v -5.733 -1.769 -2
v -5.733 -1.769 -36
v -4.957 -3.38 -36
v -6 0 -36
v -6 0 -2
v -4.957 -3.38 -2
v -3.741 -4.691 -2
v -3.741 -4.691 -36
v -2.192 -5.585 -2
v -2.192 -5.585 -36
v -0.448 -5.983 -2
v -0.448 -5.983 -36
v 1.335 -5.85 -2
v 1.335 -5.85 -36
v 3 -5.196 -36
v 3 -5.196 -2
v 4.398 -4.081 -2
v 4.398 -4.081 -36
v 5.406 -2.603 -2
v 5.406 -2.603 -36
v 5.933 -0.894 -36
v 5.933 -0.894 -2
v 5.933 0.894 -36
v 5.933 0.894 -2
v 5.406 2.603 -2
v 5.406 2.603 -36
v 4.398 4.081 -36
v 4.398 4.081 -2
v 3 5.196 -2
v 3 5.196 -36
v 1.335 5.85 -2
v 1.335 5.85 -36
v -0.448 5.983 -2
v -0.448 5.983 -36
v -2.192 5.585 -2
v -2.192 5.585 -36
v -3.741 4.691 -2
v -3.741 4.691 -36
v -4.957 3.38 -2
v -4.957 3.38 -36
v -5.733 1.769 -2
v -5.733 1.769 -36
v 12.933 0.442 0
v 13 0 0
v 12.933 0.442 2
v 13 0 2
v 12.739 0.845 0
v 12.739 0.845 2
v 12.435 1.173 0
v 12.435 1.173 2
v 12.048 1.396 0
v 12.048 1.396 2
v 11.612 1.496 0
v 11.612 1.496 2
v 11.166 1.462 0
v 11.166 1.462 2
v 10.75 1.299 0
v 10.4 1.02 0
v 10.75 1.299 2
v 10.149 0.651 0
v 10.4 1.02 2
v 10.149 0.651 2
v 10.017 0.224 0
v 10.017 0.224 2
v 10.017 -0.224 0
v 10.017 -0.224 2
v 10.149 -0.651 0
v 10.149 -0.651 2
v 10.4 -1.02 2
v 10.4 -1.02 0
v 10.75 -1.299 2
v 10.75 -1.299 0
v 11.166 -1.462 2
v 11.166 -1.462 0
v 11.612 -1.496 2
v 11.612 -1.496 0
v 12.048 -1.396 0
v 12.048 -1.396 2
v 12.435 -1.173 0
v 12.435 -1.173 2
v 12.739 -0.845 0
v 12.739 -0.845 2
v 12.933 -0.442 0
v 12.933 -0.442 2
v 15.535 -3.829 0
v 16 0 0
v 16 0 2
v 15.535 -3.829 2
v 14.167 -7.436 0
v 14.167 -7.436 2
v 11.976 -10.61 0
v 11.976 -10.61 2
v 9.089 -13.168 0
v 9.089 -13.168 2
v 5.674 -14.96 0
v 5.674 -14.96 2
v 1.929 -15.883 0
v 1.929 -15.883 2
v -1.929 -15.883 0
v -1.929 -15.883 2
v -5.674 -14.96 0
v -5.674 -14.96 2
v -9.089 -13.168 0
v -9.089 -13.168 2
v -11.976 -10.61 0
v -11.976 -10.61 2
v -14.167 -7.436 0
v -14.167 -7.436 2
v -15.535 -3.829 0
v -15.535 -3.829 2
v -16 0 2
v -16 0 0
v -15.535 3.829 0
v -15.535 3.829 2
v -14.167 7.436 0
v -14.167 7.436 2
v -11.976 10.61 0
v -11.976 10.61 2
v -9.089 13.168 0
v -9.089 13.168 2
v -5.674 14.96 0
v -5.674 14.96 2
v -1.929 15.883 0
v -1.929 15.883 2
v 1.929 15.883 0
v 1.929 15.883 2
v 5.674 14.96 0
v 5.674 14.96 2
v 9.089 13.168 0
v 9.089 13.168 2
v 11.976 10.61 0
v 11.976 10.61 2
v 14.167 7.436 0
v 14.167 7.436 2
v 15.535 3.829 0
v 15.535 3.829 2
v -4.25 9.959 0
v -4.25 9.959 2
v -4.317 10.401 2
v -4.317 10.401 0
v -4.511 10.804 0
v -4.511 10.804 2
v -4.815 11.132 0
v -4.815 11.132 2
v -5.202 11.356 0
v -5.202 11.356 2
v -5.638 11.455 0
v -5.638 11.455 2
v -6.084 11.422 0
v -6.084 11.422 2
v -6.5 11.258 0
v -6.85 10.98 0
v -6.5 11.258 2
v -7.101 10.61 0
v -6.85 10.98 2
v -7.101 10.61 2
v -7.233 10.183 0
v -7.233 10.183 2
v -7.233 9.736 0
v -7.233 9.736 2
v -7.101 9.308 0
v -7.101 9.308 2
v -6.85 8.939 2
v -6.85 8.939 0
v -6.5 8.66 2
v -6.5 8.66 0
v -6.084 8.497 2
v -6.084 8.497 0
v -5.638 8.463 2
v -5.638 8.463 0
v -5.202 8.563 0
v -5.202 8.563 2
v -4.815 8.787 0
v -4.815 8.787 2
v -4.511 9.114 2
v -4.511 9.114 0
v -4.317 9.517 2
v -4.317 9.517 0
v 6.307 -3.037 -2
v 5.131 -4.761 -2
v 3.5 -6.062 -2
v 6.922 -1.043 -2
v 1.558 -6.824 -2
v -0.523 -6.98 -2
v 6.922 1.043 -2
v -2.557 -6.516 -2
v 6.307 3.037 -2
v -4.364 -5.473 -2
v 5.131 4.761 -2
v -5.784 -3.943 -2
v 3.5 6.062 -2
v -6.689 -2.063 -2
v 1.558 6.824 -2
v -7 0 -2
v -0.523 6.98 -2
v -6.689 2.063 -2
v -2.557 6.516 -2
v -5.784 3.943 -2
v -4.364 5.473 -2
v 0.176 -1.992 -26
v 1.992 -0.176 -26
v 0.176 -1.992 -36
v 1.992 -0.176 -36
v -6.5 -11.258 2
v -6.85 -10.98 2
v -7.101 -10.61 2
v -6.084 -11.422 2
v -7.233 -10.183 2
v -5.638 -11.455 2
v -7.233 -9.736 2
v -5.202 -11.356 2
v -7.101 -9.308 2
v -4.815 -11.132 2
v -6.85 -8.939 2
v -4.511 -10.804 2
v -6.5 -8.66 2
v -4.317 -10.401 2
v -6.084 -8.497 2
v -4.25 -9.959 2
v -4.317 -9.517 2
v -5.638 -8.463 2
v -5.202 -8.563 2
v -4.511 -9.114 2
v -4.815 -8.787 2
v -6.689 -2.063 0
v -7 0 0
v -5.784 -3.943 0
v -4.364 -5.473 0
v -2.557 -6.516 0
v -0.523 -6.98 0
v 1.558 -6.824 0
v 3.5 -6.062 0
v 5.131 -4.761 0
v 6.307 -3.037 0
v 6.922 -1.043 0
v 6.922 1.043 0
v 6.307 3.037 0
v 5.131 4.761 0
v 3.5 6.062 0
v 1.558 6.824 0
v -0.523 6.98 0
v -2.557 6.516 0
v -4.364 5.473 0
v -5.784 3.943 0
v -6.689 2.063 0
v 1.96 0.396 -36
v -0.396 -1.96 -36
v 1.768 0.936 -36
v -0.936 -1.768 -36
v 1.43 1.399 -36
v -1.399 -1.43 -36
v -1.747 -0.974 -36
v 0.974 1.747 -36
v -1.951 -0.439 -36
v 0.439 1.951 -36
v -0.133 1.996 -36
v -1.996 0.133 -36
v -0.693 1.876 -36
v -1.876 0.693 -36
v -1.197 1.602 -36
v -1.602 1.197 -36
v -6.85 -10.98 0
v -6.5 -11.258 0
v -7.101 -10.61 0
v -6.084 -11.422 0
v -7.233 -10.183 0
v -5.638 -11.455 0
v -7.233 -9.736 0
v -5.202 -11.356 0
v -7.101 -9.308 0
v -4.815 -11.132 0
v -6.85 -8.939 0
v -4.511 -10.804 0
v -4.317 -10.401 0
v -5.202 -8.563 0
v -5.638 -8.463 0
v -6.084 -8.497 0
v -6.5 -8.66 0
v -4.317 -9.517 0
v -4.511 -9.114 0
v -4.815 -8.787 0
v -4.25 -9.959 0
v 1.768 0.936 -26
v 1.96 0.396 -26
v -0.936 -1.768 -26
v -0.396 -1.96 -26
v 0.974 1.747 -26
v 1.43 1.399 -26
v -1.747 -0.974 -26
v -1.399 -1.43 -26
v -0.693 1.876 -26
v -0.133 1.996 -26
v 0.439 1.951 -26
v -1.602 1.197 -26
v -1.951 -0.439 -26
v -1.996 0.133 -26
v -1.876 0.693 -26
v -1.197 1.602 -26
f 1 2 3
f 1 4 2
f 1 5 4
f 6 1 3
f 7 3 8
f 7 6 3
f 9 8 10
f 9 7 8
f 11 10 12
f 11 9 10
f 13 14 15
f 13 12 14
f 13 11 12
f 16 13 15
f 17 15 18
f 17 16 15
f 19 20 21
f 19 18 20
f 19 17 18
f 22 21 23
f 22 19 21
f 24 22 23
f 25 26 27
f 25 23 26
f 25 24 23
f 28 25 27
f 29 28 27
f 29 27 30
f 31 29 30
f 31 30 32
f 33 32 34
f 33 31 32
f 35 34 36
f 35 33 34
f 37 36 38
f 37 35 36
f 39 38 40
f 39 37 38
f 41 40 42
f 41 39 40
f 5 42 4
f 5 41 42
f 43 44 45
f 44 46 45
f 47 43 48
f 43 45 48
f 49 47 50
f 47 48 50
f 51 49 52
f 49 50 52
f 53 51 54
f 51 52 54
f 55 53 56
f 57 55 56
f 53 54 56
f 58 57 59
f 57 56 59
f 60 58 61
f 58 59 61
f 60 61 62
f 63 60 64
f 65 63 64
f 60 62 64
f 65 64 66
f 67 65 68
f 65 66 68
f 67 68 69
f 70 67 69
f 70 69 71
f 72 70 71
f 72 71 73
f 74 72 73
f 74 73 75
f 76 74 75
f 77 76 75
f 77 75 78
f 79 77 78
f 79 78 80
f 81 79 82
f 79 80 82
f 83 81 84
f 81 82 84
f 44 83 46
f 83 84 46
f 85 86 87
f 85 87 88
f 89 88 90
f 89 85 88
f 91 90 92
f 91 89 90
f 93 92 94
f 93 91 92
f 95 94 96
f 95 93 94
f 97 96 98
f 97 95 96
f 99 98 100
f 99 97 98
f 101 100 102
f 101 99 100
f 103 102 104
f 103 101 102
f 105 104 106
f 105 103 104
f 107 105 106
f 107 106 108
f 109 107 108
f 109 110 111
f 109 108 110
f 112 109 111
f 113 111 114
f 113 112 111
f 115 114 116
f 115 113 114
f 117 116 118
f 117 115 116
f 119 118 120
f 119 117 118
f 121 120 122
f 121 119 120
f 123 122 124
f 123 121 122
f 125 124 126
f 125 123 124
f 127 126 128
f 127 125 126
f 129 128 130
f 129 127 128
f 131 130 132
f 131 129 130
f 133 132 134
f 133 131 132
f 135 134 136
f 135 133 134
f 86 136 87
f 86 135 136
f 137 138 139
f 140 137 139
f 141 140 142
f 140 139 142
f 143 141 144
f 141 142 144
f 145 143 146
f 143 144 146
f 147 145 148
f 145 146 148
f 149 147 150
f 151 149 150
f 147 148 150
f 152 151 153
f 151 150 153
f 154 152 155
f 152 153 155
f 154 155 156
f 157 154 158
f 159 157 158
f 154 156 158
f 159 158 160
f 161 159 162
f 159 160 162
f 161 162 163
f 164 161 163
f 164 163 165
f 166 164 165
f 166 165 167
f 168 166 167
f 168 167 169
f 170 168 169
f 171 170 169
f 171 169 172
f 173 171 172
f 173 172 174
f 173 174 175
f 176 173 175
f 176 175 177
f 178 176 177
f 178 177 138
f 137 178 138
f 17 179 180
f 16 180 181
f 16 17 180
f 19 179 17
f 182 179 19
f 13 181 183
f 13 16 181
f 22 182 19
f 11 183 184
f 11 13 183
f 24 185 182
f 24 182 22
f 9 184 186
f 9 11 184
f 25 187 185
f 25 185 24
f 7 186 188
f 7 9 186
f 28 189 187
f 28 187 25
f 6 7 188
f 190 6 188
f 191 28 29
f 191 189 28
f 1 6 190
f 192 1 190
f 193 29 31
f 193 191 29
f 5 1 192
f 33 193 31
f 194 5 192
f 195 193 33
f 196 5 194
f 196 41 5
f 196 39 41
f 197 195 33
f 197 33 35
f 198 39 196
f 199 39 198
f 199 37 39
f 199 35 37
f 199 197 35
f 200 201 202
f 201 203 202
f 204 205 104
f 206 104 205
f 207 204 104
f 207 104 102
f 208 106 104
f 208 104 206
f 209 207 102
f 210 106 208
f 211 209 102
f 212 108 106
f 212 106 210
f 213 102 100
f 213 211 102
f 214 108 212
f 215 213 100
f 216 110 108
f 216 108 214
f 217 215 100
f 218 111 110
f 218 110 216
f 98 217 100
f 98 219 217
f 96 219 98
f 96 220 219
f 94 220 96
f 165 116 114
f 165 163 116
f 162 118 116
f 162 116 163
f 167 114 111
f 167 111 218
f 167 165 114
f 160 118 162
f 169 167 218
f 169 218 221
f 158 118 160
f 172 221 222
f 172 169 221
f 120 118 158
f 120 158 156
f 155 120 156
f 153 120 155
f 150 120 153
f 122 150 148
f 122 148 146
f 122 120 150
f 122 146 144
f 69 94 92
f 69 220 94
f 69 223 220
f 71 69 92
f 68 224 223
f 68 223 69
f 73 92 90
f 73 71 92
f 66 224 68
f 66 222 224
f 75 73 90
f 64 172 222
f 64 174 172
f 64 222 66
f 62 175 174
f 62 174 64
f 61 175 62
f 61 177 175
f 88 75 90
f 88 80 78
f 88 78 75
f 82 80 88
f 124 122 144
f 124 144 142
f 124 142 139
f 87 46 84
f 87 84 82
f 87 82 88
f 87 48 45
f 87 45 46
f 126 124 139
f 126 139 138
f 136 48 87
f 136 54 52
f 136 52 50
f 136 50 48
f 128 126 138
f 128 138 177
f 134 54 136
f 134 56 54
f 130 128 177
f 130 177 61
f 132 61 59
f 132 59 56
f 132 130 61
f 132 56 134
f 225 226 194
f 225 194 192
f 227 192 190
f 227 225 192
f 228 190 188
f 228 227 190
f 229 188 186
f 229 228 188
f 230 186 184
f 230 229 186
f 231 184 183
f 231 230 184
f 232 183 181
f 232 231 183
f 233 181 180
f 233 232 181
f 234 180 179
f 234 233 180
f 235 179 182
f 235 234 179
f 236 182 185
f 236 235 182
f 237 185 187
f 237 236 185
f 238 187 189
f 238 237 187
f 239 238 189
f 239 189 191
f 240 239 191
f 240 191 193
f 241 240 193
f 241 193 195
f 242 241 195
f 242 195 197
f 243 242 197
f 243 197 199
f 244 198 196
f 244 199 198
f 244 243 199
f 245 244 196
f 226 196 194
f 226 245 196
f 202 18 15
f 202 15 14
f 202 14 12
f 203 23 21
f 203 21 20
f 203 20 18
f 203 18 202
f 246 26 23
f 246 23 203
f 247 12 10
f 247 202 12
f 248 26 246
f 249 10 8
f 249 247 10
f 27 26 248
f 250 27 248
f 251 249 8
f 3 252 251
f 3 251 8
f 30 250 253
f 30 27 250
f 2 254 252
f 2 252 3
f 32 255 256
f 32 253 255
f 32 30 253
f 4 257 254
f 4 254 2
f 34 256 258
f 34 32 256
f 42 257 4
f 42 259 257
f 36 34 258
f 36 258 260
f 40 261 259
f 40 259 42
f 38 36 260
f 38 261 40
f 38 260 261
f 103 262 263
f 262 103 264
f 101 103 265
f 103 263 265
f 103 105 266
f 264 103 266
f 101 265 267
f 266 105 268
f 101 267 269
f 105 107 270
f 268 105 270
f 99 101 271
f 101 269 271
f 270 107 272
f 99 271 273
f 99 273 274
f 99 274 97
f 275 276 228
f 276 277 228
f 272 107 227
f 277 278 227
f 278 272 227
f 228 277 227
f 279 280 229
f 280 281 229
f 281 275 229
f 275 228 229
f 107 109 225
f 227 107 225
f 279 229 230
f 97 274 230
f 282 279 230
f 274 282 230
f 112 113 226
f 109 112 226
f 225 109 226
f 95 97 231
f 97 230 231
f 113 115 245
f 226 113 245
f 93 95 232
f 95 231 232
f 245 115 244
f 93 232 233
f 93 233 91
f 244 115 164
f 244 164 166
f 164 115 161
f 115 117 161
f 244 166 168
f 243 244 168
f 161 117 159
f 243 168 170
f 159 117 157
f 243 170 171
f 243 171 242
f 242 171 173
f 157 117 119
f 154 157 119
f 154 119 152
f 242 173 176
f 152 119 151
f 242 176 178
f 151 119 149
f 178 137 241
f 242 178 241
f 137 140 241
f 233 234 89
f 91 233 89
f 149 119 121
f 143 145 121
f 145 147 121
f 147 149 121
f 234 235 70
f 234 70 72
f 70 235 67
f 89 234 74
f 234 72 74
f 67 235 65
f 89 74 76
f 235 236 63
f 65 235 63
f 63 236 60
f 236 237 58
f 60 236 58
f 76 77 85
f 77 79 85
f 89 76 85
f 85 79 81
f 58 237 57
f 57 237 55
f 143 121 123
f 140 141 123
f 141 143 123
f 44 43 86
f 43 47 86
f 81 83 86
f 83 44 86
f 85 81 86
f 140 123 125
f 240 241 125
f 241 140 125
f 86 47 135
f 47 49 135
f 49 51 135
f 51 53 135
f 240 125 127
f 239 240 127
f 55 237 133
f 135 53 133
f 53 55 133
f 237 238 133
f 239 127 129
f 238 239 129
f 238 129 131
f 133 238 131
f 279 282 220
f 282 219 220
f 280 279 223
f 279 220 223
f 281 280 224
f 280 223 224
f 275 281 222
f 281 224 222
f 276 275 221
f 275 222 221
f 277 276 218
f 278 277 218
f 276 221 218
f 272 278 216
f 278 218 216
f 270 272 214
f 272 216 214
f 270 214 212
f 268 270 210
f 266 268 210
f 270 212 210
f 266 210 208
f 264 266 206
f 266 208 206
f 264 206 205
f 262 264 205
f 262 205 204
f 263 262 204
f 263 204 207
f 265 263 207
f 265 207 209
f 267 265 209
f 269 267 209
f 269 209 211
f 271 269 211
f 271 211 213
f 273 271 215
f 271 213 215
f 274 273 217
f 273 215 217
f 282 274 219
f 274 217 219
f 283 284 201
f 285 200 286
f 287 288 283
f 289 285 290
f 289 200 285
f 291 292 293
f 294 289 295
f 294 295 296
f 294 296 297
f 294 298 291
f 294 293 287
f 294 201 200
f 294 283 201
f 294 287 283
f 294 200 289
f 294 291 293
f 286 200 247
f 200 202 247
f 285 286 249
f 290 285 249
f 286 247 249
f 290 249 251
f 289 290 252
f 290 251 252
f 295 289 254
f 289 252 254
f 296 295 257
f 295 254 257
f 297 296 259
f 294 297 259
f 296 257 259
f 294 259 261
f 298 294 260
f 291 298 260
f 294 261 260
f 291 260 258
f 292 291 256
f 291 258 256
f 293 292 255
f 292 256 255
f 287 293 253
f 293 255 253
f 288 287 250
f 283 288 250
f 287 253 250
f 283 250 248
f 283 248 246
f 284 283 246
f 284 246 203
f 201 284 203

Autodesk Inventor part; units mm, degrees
ref_plane "YZ Plane" through (0, 0, 0) normal (1, 0, 0) x (0, 1, 0)
ref_plane "XZ Plane" through (0, 0, 0) normal (0, 1, 0) x (-1, 0, 0)
ref_plane "XY Plane" through (0, 0, 0) normal (0, 0, 1) x (1, 0, 0)
sketch "Skizze1" plane through (0, 0, 0) normal (0, 0, 1) x (1, 0, 0)
  circle A0 centre (0, 0) radius 16
  dimension "d0" = 32
extrude "Befestigungsfläche" add sketch "Skizze1" along normal blind 2
sketch "Skizze2" plane through (0, 0, 0) normal (0, 0, -1) x (-1, 0, 0)
  circle A0 centre (0, 0) radius 7
  dimension "d4" = 14
extrude "Mittelfläche" add sketch "Skizze2" along normal blind 2
sketch "Skizze3" plane through (0, 0, -2) normal (0, 0, -1) x (-1, 0, 0)
  circle A0 centre (0, 0) radius 6
  dimension "d7" = 12
extrude "Hauptkörper" add sketch "Skizze3" along normal blind 34
sketch "Skizze4" plane through (0, 0, -36) normal (0, 0, -1) x (-1, 0, 0)
  arc A0 (-0.1762, -1.9922) -> (-1.9922, -0.1762) centre (0, 0) ccw
  line L0 (-1.9922, -0.1762) -> (-0.1762, -1.9922)
  dimension "d10" = 4
extrude "Motorschaft (negativ)" cut sketch "Skizze4" against normal blind 10
sketch "Skizze6" plane through (0, 0, 2) normal (0, 0, 1) x (1, 0, 0)
  circle A0 centre (0, 0) radius 7
  line L0 (0, 0) -> (11.5, 0) construction
  line L1 (0, 0) -> (11.5, 0) construction
  circle A1 centre (11.5, 0) radius 1.5
  circle A2 centre (-5.75, 9.9593) radius 1.5
  circle A3 centre (-5.75, -9.9593) radius 1.5
  line L2 (0, 0) -> (11.5, 0)
  line L3 (0, 0) -> (-5.75, -9.9593)
  line L4 (0, 0) -> (11.5, 0) construction
  line L5 (0, 0) -> (-5.75, 9.9593)
  line L6 (0, 0) -> (11.5, 0) construction
  dimension "d14" = 14
  dimension "d21" = 3
  dimension "d22" = 3
  dimension "d23" = 3
  dimension "d26" = 11.5
  dimension "d27" = 11.5
  dimension "d28" = 120
  dimension "d29" = 11.5
  dimension "d30" = 120
extrude "Löcher" cut sketch "Skizze6" against normal blind 2 contours A3 | A2 | A1
properties part number "Motorbefestigung"
